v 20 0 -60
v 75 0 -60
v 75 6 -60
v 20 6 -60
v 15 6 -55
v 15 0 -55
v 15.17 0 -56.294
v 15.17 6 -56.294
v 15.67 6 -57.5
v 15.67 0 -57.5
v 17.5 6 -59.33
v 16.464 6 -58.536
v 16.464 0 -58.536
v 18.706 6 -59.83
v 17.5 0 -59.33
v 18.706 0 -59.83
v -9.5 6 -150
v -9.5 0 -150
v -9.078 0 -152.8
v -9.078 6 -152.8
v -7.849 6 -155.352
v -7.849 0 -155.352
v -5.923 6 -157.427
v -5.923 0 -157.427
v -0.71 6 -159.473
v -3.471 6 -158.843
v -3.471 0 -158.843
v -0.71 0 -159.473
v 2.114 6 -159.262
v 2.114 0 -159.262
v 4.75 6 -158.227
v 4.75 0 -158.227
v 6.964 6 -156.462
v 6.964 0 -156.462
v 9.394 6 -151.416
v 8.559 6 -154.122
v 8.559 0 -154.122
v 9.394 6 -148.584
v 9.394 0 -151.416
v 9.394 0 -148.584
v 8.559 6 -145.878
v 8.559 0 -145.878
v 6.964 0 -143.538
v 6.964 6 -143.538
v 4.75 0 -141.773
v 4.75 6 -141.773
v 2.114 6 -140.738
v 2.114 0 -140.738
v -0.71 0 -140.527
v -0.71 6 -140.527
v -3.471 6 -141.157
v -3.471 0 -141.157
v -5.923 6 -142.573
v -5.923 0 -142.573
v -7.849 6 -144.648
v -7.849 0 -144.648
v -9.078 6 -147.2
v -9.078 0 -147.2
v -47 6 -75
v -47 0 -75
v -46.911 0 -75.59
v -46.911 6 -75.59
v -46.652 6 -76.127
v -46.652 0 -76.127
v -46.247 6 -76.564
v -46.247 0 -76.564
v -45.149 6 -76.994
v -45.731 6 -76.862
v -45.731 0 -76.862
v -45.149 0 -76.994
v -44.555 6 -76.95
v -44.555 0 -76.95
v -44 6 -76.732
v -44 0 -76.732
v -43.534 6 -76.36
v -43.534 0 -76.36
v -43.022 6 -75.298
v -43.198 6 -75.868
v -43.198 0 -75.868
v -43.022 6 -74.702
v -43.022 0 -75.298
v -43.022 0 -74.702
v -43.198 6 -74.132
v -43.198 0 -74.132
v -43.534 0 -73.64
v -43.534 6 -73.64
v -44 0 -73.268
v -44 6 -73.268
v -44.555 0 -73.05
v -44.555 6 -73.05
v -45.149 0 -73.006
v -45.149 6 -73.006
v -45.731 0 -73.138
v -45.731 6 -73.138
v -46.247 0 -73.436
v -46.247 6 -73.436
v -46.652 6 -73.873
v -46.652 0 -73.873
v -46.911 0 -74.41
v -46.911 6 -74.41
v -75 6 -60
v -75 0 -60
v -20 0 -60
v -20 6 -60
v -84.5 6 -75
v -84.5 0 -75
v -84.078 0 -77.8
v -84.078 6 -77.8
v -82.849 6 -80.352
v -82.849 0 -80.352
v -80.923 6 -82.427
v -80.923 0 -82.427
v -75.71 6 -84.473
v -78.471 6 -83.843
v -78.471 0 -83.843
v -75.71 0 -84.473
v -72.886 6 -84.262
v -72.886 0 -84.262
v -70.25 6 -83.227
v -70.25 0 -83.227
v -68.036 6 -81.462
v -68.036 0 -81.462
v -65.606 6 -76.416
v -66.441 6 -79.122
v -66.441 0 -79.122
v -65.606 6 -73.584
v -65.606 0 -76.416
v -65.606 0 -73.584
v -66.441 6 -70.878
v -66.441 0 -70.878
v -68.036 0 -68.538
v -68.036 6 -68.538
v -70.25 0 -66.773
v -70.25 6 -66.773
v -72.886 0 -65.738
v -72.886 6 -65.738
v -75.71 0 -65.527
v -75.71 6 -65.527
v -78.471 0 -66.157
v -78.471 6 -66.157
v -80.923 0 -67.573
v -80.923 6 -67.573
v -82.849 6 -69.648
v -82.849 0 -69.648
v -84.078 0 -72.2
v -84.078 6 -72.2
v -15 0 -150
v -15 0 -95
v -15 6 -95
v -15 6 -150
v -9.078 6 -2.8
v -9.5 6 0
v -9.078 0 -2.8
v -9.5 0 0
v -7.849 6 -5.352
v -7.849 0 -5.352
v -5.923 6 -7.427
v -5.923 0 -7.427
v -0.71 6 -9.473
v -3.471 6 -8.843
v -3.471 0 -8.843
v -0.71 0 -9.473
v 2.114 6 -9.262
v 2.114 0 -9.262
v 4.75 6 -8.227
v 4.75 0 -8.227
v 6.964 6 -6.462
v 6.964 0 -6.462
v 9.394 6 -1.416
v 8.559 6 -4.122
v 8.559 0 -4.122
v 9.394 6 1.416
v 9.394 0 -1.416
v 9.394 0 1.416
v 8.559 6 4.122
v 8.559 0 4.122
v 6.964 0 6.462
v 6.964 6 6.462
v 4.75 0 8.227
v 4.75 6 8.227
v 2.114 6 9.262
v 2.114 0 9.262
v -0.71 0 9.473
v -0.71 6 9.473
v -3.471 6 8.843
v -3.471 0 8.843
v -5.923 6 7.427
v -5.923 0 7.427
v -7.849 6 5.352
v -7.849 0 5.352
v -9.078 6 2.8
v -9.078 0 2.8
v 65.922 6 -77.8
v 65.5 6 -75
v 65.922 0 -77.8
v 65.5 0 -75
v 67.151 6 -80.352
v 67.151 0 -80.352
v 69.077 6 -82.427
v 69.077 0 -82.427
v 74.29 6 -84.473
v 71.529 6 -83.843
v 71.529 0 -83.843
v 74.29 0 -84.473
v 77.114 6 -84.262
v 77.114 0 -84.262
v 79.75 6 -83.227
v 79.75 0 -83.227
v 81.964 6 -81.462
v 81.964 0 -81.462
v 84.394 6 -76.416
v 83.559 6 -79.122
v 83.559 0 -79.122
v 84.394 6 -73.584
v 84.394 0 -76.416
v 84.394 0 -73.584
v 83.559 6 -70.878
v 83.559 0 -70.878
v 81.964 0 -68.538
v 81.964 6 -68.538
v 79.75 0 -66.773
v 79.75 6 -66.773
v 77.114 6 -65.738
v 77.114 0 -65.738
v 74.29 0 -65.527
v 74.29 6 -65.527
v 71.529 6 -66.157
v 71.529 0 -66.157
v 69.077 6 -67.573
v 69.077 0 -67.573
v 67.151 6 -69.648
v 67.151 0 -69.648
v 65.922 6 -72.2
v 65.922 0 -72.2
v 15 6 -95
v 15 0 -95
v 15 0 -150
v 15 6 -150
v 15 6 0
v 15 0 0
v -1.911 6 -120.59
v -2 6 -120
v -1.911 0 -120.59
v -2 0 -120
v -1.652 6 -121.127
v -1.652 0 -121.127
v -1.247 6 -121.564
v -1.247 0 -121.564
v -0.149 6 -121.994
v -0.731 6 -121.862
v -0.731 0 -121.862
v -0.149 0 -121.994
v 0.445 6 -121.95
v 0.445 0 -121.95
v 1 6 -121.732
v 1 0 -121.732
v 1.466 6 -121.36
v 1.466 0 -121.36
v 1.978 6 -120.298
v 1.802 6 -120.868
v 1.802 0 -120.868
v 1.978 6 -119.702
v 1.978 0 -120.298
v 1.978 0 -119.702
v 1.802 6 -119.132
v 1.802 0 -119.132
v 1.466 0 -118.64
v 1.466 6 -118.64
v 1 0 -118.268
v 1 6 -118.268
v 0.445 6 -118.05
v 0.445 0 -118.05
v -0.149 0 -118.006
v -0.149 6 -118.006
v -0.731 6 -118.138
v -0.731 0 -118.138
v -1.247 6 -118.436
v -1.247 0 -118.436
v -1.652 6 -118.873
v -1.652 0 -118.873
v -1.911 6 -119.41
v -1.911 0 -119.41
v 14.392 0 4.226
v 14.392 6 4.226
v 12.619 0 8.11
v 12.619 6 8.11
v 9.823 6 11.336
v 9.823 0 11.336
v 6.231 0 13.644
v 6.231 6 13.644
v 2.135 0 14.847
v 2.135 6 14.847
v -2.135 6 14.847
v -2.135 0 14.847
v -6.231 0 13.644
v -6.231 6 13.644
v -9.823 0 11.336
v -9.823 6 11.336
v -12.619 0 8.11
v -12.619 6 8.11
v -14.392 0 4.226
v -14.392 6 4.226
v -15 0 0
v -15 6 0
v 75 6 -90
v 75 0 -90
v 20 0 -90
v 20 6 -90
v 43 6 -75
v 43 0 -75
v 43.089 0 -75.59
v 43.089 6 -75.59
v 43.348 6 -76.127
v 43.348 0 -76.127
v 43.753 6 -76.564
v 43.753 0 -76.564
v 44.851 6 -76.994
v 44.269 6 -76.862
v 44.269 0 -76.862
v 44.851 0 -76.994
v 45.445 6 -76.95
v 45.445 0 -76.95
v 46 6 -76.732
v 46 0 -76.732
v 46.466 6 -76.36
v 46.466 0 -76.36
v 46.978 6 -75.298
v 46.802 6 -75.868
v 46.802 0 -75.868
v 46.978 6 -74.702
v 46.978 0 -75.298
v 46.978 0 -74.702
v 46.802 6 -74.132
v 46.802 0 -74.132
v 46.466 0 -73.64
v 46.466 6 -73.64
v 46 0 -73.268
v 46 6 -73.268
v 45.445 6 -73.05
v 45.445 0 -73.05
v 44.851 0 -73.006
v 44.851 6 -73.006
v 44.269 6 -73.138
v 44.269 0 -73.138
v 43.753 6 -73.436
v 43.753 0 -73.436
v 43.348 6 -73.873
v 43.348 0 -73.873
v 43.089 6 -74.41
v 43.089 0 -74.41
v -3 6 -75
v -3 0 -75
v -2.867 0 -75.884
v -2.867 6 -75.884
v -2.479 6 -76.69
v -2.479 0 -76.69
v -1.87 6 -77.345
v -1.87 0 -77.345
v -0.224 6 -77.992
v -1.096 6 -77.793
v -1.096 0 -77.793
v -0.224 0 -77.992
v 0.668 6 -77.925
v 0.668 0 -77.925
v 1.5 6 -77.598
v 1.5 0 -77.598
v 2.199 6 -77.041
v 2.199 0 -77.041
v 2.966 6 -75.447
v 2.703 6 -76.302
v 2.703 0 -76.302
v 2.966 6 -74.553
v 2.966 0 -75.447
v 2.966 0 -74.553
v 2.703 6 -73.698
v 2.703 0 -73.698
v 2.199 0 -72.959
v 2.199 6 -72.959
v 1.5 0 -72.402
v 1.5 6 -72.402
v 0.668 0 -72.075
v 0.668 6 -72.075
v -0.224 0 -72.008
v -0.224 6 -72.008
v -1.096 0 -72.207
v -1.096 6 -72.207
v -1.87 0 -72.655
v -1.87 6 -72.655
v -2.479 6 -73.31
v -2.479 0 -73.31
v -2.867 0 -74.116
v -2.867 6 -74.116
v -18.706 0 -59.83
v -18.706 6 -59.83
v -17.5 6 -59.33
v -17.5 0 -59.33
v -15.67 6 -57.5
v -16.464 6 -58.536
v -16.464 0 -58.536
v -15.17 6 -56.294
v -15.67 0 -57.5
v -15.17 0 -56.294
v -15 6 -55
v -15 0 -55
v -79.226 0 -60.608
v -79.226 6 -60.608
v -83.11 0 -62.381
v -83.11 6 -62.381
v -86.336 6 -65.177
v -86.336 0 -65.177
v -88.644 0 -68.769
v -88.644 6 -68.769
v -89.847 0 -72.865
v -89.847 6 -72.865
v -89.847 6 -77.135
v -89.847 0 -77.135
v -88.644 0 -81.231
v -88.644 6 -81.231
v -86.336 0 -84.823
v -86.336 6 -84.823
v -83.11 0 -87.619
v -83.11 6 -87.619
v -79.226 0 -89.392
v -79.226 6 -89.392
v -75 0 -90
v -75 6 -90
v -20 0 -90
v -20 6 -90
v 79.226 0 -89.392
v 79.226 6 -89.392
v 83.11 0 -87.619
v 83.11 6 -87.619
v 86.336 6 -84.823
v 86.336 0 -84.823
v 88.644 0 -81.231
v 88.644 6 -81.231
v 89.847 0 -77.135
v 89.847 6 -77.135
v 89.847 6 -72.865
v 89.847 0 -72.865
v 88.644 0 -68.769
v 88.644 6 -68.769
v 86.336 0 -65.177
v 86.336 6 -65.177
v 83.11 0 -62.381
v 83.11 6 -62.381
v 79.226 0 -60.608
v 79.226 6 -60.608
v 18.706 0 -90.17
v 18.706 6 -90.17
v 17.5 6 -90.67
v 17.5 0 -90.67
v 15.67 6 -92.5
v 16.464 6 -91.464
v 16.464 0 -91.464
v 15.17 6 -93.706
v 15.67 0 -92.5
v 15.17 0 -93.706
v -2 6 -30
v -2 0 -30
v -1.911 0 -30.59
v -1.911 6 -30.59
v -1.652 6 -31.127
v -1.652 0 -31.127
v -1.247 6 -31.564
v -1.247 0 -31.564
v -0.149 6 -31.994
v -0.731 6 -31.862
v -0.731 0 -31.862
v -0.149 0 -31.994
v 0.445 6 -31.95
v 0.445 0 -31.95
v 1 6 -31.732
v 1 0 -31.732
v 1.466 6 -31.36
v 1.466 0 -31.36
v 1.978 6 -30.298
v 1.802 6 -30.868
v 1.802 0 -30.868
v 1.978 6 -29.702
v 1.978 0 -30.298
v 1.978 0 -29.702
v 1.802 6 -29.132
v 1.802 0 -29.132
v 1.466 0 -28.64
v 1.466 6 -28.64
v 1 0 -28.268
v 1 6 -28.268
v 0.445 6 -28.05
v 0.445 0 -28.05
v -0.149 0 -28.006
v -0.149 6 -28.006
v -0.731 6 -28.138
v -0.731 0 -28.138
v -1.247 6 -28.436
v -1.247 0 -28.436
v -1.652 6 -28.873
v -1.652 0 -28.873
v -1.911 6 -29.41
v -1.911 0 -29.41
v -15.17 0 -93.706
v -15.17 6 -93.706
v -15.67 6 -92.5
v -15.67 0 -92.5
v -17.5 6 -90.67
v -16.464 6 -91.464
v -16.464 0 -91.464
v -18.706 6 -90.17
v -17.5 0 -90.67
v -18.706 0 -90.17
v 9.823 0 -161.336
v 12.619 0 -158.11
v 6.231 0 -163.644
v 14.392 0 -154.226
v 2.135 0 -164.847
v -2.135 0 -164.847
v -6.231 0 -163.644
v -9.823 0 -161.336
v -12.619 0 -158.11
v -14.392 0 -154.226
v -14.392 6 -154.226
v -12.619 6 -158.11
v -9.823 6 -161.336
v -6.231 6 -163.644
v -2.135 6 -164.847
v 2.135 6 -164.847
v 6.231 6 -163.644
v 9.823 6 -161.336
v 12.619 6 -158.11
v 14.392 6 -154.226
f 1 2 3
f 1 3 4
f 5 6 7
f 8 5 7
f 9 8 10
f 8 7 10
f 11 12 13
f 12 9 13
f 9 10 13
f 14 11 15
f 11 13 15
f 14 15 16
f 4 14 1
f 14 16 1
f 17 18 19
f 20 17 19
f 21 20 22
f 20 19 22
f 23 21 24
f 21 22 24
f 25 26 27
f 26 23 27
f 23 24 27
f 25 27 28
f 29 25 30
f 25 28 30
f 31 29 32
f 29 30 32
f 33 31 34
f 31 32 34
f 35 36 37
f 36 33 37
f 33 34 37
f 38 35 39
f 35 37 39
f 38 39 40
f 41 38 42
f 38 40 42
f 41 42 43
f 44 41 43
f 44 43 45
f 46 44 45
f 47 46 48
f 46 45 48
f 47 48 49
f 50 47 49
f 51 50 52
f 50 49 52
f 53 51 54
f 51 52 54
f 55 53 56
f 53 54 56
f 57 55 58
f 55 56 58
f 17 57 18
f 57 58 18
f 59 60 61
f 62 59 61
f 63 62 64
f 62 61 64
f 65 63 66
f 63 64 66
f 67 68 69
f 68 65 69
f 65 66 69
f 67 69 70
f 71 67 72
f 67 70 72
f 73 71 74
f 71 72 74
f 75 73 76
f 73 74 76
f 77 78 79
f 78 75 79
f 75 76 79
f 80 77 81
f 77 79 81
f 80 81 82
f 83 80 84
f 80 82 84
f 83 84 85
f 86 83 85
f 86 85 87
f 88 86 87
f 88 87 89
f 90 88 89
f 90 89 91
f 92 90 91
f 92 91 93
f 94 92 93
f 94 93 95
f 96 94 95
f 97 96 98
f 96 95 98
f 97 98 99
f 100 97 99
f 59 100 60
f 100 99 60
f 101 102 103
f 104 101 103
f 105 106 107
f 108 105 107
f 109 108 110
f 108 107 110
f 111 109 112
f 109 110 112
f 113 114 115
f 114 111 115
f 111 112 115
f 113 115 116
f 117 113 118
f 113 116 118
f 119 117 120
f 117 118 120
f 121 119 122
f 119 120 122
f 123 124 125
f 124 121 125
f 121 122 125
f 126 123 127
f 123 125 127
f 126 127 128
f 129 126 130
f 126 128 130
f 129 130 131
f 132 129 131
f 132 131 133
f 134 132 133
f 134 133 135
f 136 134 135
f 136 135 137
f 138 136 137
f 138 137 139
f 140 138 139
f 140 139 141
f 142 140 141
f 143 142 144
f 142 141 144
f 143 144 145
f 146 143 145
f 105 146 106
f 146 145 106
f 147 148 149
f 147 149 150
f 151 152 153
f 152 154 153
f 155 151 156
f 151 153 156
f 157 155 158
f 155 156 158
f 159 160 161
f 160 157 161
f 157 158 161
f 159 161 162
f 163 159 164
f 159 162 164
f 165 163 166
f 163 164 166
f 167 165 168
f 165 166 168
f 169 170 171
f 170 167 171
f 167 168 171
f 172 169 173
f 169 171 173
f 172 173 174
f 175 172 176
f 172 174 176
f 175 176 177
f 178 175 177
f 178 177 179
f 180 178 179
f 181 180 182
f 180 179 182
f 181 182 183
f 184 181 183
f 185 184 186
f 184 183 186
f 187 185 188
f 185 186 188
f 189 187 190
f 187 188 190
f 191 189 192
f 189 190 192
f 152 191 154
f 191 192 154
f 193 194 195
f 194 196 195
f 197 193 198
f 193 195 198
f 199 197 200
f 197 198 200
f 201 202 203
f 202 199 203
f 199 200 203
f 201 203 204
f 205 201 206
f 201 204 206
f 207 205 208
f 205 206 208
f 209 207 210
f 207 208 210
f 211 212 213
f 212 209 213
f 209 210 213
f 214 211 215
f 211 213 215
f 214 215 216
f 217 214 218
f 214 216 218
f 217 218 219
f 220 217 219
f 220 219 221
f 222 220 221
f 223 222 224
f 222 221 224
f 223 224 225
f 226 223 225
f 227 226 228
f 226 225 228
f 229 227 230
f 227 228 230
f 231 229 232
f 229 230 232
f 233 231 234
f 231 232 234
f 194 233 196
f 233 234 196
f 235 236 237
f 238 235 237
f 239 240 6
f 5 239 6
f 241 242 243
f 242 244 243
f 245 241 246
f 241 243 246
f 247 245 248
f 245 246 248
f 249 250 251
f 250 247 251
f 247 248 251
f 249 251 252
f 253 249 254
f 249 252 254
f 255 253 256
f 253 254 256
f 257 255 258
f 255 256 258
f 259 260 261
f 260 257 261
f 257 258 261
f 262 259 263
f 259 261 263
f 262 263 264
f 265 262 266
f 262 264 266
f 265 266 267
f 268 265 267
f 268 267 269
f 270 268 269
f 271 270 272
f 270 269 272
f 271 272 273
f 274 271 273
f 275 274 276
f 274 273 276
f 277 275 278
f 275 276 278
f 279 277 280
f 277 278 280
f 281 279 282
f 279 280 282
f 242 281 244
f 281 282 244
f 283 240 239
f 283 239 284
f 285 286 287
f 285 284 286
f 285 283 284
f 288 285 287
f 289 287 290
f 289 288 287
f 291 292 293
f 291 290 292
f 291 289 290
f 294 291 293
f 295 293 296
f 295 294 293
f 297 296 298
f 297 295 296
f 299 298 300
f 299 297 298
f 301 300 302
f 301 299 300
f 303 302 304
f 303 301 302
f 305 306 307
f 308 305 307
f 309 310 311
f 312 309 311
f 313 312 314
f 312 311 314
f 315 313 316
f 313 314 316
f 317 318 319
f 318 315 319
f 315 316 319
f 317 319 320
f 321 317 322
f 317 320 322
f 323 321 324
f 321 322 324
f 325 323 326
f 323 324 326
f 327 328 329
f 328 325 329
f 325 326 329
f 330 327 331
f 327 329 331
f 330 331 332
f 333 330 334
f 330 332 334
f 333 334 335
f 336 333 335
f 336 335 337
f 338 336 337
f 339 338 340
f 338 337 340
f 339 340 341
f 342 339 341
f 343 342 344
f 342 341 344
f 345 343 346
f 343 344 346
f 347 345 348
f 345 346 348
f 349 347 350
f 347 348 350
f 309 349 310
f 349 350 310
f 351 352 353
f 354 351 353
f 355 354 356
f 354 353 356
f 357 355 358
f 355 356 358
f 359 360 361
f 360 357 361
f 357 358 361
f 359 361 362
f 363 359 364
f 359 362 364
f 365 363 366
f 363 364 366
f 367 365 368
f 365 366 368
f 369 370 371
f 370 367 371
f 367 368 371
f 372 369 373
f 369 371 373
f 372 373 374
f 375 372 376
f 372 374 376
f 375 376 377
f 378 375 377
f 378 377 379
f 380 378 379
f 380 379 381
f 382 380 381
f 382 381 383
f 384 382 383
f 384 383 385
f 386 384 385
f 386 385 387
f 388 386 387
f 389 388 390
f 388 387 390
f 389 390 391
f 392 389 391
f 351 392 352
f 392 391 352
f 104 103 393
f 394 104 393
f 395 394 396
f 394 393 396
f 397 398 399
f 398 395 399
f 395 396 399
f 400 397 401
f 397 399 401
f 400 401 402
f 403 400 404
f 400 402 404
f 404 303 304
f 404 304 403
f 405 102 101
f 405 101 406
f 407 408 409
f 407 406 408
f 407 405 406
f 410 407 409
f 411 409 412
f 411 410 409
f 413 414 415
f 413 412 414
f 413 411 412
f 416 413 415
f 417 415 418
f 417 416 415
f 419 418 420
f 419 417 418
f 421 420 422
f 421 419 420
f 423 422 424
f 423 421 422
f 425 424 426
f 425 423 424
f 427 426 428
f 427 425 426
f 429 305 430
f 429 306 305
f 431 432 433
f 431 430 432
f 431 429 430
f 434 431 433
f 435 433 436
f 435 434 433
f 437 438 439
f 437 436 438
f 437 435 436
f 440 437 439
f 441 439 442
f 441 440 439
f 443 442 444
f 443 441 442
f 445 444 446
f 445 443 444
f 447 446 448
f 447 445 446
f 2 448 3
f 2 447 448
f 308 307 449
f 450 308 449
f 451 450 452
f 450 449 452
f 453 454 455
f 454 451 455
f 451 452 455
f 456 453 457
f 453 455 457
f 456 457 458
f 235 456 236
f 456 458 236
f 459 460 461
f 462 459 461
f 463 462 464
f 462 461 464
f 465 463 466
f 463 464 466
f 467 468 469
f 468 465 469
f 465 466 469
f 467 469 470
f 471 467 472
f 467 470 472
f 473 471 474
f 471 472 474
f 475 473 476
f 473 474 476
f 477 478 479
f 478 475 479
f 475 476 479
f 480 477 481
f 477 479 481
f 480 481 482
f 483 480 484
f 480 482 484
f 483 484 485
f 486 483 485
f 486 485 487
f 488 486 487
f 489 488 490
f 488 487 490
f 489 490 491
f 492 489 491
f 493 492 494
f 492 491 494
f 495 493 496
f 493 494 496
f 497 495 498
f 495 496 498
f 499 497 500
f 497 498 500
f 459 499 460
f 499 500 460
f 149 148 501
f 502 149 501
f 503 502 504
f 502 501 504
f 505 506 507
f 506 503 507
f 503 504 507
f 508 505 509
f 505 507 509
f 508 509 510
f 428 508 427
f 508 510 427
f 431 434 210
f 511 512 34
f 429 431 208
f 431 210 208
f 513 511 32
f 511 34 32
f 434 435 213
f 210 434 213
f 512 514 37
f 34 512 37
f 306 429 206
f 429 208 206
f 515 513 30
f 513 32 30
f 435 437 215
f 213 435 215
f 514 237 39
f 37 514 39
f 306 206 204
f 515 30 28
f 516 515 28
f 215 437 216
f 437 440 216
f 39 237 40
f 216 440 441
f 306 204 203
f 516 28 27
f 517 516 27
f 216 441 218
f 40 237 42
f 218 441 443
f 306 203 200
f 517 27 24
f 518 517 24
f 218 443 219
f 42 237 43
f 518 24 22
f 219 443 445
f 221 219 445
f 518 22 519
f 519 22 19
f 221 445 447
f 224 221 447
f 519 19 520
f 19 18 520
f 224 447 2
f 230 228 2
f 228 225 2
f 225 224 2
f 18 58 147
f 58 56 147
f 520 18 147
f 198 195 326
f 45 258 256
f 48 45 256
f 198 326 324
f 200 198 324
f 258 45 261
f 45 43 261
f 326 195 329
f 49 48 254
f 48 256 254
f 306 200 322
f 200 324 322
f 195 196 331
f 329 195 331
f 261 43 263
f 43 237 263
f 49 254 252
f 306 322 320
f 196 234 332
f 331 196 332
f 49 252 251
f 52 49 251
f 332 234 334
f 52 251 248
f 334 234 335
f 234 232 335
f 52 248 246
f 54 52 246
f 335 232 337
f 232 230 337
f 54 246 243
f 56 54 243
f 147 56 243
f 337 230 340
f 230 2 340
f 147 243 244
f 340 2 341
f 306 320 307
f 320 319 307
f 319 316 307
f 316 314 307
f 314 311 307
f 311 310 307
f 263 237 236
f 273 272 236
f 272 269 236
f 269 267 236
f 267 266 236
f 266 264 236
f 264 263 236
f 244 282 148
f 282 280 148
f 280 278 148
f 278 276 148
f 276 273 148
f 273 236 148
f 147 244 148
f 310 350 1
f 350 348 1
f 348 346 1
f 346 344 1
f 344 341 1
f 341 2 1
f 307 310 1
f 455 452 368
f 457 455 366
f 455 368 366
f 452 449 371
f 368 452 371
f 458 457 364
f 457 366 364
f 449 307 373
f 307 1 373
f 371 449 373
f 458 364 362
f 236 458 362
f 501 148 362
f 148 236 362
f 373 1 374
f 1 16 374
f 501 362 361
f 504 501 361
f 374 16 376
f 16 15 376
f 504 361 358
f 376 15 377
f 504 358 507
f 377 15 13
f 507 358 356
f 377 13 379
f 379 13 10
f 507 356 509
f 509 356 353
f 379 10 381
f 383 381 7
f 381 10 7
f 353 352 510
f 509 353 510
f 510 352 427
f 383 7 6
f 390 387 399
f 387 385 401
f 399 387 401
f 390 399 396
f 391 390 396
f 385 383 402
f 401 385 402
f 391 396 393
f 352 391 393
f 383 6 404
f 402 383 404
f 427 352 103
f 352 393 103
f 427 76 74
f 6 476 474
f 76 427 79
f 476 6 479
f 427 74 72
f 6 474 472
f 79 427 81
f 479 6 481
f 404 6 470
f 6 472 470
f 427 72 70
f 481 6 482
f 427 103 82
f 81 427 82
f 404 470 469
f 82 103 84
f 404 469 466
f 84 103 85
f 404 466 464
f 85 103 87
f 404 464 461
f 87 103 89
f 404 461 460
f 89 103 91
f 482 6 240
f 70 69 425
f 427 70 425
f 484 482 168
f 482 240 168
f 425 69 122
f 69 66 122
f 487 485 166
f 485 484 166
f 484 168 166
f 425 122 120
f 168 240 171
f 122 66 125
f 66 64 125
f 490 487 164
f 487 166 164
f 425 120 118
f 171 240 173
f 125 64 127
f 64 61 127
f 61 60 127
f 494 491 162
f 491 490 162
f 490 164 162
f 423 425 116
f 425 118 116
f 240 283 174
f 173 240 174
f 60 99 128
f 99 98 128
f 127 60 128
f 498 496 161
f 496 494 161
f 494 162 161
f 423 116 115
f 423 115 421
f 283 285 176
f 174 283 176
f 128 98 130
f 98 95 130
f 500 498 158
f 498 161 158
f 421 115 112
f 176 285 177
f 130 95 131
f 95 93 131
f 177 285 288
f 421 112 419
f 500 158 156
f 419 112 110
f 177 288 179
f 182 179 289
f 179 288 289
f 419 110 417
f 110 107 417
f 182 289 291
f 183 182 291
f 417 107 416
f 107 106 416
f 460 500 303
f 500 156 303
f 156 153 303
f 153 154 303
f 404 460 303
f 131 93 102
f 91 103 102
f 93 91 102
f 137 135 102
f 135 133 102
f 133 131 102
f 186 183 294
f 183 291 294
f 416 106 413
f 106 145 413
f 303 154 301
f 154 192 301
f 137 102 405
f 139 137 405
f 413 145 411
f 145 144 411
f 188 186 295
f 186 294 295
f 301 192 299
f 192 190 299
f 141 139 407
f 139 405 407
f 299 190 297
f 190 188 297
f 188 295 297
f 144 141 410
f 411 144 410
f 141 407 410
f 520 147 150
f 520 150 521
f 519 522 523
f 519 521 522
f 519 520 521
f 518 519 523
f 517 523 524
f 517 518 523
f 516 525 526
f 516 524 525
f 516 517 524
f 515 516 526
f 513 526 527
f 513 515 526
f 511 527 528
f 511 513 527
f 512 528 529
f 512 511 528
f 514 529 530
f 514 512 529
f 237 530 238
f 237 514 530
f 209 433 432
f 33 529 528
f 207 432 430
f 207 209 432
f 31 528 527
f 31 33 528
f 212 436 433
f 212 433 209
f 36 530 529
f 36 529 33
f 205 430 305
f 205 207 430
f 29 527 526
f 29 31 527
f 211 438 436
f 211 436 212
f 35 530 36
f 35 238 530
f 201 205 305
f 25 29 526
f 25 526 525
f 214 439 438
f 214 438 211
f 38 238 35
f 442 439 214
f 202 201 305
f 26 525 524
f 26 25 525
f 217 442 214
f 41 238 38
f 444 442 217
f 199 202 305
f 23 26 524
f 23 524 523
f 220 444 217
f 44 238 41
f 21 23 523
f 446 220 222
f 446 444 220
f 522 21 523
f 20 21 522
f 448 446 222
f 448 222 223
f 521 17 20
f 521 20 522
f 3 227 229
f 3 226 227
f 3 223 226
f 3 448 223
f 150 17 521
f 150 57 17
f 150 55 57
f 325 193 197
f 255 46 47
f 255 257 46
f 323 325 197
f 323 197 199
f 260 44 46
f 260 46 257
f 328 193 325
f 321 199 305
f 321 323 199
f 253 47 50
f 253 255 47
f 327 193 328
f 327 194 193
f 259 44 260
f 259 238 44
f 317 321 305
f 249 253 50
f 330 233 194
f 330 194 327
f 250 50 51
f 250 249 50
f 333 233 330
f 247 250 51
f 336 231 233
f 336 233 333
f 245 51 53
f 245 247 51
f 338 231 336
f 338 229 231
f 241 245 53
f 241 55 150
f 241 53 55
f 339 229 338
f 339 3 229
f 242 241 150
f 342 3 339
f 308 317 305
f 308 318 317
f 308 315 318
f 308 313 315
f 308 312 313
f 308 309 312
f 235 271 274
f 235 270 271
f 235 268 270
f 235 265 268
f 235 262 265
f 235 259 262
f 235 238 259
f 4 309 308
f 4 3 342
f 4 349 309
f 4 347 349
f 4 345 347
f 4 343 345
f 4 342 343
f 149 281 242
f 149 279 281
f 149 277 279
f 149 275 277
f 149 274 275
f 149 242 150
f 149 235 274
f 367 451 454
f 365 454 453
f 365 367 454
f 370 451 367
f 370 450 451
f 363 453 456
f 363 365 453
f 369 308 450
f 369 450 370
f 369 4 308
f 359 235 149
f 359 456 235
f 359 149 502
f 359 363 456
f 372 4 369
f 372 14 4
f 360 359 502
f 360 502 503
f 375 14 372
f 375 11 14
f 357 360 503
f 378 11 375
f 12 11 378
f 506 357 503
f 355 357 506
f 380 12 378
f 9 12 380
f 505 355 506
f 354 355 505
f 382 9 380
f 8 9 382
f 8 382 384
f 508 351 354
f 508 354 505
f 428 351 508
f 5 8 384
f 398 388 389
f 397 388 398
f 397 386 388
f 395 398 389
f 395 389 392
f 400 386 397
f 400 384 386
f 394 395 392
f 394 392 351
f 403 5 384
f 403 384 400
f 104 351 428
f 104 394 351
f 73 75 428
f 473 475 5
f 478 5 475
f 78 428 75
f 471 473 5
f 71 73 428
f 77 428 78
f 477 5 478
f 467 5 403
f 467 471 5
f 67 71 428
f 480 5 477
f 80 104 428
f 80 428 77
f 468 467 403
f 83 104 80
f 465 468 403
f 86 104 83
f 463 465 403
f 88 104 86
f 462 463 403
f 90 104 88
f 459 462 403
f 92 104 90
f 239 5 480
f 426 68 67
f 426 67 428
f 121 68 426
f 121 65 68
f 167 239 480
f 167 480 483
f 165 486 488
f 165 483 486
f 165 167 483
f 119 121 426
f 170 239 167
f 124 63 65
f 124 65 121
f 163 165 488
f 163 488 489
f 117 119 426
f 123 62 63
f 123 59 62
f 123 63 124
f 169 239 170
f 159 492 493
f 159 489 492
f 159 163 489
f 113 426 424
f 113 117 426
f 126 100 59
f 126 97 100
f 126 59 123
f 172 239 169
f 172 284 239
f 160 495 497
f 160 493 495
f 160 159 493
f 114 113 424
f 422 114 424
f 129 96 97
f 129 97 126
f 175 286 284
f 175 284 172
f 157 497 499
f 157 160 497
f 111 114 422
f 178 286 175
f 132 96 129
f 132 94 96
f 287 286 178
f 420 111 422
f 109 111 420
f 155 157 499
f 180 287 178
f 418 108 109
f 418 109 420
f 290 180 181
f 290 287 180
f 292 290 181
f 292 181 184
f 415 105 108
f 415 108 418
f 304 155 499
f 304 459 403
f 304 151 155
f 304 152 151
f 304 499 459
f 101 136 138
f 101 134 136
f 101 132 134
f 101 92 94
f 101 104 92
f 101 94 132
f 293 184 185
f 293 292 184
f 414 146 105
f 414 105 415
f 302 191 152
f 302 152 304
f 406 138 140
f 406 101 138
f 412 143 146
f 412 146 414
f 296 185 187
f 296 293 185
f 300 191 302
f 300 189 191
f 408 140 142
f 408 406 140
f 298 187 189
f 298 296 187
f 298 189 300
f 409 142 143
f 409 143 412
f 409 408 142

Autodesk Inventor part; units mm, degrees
ref_plane "YZ Plane" through (0, 0, 0) normal (1, 0, 0) x (0, 1, 0)
ref_plane "XZ Plane" through (0, 0, 0) normal (0, 1, 0) x (-1, 0, 0)
ref_plane "XY Plane" through (0, 0, 0) normal (0, 0, 1) x (1, 0, 0)
sketch "Sketch1" plane through (0, 0, 0) normal (0, 1, 0) x (-1, 0, 0)
  circle A0 centre (75, -75) radius 9.5
  arc A1 (75, -90) -> (75, -60) centre (75, -75) ccw
  circle A2 centre (0, 0) radius 9.5
  arc A3 (15, 0) -> (-15, 0) centre (0, 0) ccw
  circle A4 centre (-75, -75) radius 9.5
  arc A5 (-75, -60) -> (-75, -90) centre (-75, -75) ccw
  circle A6 centre (0, -150) radius 9.5
  arc A7 (-15, -150) -> (15, -150) centre (0, -150) ccw
  line L0 (-75, -60) -> (-20, -60)
  line L1 (-75, -90) -> (-20, -90)
  line L2 (75, -60) -> (20, -60)
  line L3 (75, -90) -> (20, -90)
  line L4 (15, 0) -> (15, -55)
  line L5 (15, -95) -> (15, -150)
  line L6 (-15, 0) -> (-15, -55)
  line L7 (-15, -95) -> (-15, -150)
  arc A8 (15, -55) -> (20, -60) centre (20, -55) ccw
  arc A9 (-20, -60) -> (-15, -55) centre (-20, -55) ccw
  arc A10 (20, -90) -> (15, -95) centre (20, -95) ccw
  arc A11 (-15, -95) -> (-20, -90) centre (-20, -95) ccw
  circle A12 centre (0, -30) radius 2
  circle A13 centre (0, -120) radius 2
  circle A14 centre (-45, -75) radius 2
  circle A15 centre (45, -75) radius 2
  circle A16 centre (0, -75) radius 3
  point P0 (15, -60)
  point P1 (15, -90)
  dimension "d5" = 19
  dimension "d6" = 30
  dimension "d7" = 19
  dimension "d8" = 30
  dimension "d9" = 19
  dimension "d10" = 30
  dimension "d11" = 19
  dimension "d12" = 30
  dimension "d13" = 5
  dimension "d15" = 4
  dimension "d17" = 4
  dimension "d19" = 4
  dimension "d21" = 4
  dimension "d22" = 6
extrude "Extrusion1" add sketch "Sketch1" along normal blind 6
properties part number "e_support 1"
